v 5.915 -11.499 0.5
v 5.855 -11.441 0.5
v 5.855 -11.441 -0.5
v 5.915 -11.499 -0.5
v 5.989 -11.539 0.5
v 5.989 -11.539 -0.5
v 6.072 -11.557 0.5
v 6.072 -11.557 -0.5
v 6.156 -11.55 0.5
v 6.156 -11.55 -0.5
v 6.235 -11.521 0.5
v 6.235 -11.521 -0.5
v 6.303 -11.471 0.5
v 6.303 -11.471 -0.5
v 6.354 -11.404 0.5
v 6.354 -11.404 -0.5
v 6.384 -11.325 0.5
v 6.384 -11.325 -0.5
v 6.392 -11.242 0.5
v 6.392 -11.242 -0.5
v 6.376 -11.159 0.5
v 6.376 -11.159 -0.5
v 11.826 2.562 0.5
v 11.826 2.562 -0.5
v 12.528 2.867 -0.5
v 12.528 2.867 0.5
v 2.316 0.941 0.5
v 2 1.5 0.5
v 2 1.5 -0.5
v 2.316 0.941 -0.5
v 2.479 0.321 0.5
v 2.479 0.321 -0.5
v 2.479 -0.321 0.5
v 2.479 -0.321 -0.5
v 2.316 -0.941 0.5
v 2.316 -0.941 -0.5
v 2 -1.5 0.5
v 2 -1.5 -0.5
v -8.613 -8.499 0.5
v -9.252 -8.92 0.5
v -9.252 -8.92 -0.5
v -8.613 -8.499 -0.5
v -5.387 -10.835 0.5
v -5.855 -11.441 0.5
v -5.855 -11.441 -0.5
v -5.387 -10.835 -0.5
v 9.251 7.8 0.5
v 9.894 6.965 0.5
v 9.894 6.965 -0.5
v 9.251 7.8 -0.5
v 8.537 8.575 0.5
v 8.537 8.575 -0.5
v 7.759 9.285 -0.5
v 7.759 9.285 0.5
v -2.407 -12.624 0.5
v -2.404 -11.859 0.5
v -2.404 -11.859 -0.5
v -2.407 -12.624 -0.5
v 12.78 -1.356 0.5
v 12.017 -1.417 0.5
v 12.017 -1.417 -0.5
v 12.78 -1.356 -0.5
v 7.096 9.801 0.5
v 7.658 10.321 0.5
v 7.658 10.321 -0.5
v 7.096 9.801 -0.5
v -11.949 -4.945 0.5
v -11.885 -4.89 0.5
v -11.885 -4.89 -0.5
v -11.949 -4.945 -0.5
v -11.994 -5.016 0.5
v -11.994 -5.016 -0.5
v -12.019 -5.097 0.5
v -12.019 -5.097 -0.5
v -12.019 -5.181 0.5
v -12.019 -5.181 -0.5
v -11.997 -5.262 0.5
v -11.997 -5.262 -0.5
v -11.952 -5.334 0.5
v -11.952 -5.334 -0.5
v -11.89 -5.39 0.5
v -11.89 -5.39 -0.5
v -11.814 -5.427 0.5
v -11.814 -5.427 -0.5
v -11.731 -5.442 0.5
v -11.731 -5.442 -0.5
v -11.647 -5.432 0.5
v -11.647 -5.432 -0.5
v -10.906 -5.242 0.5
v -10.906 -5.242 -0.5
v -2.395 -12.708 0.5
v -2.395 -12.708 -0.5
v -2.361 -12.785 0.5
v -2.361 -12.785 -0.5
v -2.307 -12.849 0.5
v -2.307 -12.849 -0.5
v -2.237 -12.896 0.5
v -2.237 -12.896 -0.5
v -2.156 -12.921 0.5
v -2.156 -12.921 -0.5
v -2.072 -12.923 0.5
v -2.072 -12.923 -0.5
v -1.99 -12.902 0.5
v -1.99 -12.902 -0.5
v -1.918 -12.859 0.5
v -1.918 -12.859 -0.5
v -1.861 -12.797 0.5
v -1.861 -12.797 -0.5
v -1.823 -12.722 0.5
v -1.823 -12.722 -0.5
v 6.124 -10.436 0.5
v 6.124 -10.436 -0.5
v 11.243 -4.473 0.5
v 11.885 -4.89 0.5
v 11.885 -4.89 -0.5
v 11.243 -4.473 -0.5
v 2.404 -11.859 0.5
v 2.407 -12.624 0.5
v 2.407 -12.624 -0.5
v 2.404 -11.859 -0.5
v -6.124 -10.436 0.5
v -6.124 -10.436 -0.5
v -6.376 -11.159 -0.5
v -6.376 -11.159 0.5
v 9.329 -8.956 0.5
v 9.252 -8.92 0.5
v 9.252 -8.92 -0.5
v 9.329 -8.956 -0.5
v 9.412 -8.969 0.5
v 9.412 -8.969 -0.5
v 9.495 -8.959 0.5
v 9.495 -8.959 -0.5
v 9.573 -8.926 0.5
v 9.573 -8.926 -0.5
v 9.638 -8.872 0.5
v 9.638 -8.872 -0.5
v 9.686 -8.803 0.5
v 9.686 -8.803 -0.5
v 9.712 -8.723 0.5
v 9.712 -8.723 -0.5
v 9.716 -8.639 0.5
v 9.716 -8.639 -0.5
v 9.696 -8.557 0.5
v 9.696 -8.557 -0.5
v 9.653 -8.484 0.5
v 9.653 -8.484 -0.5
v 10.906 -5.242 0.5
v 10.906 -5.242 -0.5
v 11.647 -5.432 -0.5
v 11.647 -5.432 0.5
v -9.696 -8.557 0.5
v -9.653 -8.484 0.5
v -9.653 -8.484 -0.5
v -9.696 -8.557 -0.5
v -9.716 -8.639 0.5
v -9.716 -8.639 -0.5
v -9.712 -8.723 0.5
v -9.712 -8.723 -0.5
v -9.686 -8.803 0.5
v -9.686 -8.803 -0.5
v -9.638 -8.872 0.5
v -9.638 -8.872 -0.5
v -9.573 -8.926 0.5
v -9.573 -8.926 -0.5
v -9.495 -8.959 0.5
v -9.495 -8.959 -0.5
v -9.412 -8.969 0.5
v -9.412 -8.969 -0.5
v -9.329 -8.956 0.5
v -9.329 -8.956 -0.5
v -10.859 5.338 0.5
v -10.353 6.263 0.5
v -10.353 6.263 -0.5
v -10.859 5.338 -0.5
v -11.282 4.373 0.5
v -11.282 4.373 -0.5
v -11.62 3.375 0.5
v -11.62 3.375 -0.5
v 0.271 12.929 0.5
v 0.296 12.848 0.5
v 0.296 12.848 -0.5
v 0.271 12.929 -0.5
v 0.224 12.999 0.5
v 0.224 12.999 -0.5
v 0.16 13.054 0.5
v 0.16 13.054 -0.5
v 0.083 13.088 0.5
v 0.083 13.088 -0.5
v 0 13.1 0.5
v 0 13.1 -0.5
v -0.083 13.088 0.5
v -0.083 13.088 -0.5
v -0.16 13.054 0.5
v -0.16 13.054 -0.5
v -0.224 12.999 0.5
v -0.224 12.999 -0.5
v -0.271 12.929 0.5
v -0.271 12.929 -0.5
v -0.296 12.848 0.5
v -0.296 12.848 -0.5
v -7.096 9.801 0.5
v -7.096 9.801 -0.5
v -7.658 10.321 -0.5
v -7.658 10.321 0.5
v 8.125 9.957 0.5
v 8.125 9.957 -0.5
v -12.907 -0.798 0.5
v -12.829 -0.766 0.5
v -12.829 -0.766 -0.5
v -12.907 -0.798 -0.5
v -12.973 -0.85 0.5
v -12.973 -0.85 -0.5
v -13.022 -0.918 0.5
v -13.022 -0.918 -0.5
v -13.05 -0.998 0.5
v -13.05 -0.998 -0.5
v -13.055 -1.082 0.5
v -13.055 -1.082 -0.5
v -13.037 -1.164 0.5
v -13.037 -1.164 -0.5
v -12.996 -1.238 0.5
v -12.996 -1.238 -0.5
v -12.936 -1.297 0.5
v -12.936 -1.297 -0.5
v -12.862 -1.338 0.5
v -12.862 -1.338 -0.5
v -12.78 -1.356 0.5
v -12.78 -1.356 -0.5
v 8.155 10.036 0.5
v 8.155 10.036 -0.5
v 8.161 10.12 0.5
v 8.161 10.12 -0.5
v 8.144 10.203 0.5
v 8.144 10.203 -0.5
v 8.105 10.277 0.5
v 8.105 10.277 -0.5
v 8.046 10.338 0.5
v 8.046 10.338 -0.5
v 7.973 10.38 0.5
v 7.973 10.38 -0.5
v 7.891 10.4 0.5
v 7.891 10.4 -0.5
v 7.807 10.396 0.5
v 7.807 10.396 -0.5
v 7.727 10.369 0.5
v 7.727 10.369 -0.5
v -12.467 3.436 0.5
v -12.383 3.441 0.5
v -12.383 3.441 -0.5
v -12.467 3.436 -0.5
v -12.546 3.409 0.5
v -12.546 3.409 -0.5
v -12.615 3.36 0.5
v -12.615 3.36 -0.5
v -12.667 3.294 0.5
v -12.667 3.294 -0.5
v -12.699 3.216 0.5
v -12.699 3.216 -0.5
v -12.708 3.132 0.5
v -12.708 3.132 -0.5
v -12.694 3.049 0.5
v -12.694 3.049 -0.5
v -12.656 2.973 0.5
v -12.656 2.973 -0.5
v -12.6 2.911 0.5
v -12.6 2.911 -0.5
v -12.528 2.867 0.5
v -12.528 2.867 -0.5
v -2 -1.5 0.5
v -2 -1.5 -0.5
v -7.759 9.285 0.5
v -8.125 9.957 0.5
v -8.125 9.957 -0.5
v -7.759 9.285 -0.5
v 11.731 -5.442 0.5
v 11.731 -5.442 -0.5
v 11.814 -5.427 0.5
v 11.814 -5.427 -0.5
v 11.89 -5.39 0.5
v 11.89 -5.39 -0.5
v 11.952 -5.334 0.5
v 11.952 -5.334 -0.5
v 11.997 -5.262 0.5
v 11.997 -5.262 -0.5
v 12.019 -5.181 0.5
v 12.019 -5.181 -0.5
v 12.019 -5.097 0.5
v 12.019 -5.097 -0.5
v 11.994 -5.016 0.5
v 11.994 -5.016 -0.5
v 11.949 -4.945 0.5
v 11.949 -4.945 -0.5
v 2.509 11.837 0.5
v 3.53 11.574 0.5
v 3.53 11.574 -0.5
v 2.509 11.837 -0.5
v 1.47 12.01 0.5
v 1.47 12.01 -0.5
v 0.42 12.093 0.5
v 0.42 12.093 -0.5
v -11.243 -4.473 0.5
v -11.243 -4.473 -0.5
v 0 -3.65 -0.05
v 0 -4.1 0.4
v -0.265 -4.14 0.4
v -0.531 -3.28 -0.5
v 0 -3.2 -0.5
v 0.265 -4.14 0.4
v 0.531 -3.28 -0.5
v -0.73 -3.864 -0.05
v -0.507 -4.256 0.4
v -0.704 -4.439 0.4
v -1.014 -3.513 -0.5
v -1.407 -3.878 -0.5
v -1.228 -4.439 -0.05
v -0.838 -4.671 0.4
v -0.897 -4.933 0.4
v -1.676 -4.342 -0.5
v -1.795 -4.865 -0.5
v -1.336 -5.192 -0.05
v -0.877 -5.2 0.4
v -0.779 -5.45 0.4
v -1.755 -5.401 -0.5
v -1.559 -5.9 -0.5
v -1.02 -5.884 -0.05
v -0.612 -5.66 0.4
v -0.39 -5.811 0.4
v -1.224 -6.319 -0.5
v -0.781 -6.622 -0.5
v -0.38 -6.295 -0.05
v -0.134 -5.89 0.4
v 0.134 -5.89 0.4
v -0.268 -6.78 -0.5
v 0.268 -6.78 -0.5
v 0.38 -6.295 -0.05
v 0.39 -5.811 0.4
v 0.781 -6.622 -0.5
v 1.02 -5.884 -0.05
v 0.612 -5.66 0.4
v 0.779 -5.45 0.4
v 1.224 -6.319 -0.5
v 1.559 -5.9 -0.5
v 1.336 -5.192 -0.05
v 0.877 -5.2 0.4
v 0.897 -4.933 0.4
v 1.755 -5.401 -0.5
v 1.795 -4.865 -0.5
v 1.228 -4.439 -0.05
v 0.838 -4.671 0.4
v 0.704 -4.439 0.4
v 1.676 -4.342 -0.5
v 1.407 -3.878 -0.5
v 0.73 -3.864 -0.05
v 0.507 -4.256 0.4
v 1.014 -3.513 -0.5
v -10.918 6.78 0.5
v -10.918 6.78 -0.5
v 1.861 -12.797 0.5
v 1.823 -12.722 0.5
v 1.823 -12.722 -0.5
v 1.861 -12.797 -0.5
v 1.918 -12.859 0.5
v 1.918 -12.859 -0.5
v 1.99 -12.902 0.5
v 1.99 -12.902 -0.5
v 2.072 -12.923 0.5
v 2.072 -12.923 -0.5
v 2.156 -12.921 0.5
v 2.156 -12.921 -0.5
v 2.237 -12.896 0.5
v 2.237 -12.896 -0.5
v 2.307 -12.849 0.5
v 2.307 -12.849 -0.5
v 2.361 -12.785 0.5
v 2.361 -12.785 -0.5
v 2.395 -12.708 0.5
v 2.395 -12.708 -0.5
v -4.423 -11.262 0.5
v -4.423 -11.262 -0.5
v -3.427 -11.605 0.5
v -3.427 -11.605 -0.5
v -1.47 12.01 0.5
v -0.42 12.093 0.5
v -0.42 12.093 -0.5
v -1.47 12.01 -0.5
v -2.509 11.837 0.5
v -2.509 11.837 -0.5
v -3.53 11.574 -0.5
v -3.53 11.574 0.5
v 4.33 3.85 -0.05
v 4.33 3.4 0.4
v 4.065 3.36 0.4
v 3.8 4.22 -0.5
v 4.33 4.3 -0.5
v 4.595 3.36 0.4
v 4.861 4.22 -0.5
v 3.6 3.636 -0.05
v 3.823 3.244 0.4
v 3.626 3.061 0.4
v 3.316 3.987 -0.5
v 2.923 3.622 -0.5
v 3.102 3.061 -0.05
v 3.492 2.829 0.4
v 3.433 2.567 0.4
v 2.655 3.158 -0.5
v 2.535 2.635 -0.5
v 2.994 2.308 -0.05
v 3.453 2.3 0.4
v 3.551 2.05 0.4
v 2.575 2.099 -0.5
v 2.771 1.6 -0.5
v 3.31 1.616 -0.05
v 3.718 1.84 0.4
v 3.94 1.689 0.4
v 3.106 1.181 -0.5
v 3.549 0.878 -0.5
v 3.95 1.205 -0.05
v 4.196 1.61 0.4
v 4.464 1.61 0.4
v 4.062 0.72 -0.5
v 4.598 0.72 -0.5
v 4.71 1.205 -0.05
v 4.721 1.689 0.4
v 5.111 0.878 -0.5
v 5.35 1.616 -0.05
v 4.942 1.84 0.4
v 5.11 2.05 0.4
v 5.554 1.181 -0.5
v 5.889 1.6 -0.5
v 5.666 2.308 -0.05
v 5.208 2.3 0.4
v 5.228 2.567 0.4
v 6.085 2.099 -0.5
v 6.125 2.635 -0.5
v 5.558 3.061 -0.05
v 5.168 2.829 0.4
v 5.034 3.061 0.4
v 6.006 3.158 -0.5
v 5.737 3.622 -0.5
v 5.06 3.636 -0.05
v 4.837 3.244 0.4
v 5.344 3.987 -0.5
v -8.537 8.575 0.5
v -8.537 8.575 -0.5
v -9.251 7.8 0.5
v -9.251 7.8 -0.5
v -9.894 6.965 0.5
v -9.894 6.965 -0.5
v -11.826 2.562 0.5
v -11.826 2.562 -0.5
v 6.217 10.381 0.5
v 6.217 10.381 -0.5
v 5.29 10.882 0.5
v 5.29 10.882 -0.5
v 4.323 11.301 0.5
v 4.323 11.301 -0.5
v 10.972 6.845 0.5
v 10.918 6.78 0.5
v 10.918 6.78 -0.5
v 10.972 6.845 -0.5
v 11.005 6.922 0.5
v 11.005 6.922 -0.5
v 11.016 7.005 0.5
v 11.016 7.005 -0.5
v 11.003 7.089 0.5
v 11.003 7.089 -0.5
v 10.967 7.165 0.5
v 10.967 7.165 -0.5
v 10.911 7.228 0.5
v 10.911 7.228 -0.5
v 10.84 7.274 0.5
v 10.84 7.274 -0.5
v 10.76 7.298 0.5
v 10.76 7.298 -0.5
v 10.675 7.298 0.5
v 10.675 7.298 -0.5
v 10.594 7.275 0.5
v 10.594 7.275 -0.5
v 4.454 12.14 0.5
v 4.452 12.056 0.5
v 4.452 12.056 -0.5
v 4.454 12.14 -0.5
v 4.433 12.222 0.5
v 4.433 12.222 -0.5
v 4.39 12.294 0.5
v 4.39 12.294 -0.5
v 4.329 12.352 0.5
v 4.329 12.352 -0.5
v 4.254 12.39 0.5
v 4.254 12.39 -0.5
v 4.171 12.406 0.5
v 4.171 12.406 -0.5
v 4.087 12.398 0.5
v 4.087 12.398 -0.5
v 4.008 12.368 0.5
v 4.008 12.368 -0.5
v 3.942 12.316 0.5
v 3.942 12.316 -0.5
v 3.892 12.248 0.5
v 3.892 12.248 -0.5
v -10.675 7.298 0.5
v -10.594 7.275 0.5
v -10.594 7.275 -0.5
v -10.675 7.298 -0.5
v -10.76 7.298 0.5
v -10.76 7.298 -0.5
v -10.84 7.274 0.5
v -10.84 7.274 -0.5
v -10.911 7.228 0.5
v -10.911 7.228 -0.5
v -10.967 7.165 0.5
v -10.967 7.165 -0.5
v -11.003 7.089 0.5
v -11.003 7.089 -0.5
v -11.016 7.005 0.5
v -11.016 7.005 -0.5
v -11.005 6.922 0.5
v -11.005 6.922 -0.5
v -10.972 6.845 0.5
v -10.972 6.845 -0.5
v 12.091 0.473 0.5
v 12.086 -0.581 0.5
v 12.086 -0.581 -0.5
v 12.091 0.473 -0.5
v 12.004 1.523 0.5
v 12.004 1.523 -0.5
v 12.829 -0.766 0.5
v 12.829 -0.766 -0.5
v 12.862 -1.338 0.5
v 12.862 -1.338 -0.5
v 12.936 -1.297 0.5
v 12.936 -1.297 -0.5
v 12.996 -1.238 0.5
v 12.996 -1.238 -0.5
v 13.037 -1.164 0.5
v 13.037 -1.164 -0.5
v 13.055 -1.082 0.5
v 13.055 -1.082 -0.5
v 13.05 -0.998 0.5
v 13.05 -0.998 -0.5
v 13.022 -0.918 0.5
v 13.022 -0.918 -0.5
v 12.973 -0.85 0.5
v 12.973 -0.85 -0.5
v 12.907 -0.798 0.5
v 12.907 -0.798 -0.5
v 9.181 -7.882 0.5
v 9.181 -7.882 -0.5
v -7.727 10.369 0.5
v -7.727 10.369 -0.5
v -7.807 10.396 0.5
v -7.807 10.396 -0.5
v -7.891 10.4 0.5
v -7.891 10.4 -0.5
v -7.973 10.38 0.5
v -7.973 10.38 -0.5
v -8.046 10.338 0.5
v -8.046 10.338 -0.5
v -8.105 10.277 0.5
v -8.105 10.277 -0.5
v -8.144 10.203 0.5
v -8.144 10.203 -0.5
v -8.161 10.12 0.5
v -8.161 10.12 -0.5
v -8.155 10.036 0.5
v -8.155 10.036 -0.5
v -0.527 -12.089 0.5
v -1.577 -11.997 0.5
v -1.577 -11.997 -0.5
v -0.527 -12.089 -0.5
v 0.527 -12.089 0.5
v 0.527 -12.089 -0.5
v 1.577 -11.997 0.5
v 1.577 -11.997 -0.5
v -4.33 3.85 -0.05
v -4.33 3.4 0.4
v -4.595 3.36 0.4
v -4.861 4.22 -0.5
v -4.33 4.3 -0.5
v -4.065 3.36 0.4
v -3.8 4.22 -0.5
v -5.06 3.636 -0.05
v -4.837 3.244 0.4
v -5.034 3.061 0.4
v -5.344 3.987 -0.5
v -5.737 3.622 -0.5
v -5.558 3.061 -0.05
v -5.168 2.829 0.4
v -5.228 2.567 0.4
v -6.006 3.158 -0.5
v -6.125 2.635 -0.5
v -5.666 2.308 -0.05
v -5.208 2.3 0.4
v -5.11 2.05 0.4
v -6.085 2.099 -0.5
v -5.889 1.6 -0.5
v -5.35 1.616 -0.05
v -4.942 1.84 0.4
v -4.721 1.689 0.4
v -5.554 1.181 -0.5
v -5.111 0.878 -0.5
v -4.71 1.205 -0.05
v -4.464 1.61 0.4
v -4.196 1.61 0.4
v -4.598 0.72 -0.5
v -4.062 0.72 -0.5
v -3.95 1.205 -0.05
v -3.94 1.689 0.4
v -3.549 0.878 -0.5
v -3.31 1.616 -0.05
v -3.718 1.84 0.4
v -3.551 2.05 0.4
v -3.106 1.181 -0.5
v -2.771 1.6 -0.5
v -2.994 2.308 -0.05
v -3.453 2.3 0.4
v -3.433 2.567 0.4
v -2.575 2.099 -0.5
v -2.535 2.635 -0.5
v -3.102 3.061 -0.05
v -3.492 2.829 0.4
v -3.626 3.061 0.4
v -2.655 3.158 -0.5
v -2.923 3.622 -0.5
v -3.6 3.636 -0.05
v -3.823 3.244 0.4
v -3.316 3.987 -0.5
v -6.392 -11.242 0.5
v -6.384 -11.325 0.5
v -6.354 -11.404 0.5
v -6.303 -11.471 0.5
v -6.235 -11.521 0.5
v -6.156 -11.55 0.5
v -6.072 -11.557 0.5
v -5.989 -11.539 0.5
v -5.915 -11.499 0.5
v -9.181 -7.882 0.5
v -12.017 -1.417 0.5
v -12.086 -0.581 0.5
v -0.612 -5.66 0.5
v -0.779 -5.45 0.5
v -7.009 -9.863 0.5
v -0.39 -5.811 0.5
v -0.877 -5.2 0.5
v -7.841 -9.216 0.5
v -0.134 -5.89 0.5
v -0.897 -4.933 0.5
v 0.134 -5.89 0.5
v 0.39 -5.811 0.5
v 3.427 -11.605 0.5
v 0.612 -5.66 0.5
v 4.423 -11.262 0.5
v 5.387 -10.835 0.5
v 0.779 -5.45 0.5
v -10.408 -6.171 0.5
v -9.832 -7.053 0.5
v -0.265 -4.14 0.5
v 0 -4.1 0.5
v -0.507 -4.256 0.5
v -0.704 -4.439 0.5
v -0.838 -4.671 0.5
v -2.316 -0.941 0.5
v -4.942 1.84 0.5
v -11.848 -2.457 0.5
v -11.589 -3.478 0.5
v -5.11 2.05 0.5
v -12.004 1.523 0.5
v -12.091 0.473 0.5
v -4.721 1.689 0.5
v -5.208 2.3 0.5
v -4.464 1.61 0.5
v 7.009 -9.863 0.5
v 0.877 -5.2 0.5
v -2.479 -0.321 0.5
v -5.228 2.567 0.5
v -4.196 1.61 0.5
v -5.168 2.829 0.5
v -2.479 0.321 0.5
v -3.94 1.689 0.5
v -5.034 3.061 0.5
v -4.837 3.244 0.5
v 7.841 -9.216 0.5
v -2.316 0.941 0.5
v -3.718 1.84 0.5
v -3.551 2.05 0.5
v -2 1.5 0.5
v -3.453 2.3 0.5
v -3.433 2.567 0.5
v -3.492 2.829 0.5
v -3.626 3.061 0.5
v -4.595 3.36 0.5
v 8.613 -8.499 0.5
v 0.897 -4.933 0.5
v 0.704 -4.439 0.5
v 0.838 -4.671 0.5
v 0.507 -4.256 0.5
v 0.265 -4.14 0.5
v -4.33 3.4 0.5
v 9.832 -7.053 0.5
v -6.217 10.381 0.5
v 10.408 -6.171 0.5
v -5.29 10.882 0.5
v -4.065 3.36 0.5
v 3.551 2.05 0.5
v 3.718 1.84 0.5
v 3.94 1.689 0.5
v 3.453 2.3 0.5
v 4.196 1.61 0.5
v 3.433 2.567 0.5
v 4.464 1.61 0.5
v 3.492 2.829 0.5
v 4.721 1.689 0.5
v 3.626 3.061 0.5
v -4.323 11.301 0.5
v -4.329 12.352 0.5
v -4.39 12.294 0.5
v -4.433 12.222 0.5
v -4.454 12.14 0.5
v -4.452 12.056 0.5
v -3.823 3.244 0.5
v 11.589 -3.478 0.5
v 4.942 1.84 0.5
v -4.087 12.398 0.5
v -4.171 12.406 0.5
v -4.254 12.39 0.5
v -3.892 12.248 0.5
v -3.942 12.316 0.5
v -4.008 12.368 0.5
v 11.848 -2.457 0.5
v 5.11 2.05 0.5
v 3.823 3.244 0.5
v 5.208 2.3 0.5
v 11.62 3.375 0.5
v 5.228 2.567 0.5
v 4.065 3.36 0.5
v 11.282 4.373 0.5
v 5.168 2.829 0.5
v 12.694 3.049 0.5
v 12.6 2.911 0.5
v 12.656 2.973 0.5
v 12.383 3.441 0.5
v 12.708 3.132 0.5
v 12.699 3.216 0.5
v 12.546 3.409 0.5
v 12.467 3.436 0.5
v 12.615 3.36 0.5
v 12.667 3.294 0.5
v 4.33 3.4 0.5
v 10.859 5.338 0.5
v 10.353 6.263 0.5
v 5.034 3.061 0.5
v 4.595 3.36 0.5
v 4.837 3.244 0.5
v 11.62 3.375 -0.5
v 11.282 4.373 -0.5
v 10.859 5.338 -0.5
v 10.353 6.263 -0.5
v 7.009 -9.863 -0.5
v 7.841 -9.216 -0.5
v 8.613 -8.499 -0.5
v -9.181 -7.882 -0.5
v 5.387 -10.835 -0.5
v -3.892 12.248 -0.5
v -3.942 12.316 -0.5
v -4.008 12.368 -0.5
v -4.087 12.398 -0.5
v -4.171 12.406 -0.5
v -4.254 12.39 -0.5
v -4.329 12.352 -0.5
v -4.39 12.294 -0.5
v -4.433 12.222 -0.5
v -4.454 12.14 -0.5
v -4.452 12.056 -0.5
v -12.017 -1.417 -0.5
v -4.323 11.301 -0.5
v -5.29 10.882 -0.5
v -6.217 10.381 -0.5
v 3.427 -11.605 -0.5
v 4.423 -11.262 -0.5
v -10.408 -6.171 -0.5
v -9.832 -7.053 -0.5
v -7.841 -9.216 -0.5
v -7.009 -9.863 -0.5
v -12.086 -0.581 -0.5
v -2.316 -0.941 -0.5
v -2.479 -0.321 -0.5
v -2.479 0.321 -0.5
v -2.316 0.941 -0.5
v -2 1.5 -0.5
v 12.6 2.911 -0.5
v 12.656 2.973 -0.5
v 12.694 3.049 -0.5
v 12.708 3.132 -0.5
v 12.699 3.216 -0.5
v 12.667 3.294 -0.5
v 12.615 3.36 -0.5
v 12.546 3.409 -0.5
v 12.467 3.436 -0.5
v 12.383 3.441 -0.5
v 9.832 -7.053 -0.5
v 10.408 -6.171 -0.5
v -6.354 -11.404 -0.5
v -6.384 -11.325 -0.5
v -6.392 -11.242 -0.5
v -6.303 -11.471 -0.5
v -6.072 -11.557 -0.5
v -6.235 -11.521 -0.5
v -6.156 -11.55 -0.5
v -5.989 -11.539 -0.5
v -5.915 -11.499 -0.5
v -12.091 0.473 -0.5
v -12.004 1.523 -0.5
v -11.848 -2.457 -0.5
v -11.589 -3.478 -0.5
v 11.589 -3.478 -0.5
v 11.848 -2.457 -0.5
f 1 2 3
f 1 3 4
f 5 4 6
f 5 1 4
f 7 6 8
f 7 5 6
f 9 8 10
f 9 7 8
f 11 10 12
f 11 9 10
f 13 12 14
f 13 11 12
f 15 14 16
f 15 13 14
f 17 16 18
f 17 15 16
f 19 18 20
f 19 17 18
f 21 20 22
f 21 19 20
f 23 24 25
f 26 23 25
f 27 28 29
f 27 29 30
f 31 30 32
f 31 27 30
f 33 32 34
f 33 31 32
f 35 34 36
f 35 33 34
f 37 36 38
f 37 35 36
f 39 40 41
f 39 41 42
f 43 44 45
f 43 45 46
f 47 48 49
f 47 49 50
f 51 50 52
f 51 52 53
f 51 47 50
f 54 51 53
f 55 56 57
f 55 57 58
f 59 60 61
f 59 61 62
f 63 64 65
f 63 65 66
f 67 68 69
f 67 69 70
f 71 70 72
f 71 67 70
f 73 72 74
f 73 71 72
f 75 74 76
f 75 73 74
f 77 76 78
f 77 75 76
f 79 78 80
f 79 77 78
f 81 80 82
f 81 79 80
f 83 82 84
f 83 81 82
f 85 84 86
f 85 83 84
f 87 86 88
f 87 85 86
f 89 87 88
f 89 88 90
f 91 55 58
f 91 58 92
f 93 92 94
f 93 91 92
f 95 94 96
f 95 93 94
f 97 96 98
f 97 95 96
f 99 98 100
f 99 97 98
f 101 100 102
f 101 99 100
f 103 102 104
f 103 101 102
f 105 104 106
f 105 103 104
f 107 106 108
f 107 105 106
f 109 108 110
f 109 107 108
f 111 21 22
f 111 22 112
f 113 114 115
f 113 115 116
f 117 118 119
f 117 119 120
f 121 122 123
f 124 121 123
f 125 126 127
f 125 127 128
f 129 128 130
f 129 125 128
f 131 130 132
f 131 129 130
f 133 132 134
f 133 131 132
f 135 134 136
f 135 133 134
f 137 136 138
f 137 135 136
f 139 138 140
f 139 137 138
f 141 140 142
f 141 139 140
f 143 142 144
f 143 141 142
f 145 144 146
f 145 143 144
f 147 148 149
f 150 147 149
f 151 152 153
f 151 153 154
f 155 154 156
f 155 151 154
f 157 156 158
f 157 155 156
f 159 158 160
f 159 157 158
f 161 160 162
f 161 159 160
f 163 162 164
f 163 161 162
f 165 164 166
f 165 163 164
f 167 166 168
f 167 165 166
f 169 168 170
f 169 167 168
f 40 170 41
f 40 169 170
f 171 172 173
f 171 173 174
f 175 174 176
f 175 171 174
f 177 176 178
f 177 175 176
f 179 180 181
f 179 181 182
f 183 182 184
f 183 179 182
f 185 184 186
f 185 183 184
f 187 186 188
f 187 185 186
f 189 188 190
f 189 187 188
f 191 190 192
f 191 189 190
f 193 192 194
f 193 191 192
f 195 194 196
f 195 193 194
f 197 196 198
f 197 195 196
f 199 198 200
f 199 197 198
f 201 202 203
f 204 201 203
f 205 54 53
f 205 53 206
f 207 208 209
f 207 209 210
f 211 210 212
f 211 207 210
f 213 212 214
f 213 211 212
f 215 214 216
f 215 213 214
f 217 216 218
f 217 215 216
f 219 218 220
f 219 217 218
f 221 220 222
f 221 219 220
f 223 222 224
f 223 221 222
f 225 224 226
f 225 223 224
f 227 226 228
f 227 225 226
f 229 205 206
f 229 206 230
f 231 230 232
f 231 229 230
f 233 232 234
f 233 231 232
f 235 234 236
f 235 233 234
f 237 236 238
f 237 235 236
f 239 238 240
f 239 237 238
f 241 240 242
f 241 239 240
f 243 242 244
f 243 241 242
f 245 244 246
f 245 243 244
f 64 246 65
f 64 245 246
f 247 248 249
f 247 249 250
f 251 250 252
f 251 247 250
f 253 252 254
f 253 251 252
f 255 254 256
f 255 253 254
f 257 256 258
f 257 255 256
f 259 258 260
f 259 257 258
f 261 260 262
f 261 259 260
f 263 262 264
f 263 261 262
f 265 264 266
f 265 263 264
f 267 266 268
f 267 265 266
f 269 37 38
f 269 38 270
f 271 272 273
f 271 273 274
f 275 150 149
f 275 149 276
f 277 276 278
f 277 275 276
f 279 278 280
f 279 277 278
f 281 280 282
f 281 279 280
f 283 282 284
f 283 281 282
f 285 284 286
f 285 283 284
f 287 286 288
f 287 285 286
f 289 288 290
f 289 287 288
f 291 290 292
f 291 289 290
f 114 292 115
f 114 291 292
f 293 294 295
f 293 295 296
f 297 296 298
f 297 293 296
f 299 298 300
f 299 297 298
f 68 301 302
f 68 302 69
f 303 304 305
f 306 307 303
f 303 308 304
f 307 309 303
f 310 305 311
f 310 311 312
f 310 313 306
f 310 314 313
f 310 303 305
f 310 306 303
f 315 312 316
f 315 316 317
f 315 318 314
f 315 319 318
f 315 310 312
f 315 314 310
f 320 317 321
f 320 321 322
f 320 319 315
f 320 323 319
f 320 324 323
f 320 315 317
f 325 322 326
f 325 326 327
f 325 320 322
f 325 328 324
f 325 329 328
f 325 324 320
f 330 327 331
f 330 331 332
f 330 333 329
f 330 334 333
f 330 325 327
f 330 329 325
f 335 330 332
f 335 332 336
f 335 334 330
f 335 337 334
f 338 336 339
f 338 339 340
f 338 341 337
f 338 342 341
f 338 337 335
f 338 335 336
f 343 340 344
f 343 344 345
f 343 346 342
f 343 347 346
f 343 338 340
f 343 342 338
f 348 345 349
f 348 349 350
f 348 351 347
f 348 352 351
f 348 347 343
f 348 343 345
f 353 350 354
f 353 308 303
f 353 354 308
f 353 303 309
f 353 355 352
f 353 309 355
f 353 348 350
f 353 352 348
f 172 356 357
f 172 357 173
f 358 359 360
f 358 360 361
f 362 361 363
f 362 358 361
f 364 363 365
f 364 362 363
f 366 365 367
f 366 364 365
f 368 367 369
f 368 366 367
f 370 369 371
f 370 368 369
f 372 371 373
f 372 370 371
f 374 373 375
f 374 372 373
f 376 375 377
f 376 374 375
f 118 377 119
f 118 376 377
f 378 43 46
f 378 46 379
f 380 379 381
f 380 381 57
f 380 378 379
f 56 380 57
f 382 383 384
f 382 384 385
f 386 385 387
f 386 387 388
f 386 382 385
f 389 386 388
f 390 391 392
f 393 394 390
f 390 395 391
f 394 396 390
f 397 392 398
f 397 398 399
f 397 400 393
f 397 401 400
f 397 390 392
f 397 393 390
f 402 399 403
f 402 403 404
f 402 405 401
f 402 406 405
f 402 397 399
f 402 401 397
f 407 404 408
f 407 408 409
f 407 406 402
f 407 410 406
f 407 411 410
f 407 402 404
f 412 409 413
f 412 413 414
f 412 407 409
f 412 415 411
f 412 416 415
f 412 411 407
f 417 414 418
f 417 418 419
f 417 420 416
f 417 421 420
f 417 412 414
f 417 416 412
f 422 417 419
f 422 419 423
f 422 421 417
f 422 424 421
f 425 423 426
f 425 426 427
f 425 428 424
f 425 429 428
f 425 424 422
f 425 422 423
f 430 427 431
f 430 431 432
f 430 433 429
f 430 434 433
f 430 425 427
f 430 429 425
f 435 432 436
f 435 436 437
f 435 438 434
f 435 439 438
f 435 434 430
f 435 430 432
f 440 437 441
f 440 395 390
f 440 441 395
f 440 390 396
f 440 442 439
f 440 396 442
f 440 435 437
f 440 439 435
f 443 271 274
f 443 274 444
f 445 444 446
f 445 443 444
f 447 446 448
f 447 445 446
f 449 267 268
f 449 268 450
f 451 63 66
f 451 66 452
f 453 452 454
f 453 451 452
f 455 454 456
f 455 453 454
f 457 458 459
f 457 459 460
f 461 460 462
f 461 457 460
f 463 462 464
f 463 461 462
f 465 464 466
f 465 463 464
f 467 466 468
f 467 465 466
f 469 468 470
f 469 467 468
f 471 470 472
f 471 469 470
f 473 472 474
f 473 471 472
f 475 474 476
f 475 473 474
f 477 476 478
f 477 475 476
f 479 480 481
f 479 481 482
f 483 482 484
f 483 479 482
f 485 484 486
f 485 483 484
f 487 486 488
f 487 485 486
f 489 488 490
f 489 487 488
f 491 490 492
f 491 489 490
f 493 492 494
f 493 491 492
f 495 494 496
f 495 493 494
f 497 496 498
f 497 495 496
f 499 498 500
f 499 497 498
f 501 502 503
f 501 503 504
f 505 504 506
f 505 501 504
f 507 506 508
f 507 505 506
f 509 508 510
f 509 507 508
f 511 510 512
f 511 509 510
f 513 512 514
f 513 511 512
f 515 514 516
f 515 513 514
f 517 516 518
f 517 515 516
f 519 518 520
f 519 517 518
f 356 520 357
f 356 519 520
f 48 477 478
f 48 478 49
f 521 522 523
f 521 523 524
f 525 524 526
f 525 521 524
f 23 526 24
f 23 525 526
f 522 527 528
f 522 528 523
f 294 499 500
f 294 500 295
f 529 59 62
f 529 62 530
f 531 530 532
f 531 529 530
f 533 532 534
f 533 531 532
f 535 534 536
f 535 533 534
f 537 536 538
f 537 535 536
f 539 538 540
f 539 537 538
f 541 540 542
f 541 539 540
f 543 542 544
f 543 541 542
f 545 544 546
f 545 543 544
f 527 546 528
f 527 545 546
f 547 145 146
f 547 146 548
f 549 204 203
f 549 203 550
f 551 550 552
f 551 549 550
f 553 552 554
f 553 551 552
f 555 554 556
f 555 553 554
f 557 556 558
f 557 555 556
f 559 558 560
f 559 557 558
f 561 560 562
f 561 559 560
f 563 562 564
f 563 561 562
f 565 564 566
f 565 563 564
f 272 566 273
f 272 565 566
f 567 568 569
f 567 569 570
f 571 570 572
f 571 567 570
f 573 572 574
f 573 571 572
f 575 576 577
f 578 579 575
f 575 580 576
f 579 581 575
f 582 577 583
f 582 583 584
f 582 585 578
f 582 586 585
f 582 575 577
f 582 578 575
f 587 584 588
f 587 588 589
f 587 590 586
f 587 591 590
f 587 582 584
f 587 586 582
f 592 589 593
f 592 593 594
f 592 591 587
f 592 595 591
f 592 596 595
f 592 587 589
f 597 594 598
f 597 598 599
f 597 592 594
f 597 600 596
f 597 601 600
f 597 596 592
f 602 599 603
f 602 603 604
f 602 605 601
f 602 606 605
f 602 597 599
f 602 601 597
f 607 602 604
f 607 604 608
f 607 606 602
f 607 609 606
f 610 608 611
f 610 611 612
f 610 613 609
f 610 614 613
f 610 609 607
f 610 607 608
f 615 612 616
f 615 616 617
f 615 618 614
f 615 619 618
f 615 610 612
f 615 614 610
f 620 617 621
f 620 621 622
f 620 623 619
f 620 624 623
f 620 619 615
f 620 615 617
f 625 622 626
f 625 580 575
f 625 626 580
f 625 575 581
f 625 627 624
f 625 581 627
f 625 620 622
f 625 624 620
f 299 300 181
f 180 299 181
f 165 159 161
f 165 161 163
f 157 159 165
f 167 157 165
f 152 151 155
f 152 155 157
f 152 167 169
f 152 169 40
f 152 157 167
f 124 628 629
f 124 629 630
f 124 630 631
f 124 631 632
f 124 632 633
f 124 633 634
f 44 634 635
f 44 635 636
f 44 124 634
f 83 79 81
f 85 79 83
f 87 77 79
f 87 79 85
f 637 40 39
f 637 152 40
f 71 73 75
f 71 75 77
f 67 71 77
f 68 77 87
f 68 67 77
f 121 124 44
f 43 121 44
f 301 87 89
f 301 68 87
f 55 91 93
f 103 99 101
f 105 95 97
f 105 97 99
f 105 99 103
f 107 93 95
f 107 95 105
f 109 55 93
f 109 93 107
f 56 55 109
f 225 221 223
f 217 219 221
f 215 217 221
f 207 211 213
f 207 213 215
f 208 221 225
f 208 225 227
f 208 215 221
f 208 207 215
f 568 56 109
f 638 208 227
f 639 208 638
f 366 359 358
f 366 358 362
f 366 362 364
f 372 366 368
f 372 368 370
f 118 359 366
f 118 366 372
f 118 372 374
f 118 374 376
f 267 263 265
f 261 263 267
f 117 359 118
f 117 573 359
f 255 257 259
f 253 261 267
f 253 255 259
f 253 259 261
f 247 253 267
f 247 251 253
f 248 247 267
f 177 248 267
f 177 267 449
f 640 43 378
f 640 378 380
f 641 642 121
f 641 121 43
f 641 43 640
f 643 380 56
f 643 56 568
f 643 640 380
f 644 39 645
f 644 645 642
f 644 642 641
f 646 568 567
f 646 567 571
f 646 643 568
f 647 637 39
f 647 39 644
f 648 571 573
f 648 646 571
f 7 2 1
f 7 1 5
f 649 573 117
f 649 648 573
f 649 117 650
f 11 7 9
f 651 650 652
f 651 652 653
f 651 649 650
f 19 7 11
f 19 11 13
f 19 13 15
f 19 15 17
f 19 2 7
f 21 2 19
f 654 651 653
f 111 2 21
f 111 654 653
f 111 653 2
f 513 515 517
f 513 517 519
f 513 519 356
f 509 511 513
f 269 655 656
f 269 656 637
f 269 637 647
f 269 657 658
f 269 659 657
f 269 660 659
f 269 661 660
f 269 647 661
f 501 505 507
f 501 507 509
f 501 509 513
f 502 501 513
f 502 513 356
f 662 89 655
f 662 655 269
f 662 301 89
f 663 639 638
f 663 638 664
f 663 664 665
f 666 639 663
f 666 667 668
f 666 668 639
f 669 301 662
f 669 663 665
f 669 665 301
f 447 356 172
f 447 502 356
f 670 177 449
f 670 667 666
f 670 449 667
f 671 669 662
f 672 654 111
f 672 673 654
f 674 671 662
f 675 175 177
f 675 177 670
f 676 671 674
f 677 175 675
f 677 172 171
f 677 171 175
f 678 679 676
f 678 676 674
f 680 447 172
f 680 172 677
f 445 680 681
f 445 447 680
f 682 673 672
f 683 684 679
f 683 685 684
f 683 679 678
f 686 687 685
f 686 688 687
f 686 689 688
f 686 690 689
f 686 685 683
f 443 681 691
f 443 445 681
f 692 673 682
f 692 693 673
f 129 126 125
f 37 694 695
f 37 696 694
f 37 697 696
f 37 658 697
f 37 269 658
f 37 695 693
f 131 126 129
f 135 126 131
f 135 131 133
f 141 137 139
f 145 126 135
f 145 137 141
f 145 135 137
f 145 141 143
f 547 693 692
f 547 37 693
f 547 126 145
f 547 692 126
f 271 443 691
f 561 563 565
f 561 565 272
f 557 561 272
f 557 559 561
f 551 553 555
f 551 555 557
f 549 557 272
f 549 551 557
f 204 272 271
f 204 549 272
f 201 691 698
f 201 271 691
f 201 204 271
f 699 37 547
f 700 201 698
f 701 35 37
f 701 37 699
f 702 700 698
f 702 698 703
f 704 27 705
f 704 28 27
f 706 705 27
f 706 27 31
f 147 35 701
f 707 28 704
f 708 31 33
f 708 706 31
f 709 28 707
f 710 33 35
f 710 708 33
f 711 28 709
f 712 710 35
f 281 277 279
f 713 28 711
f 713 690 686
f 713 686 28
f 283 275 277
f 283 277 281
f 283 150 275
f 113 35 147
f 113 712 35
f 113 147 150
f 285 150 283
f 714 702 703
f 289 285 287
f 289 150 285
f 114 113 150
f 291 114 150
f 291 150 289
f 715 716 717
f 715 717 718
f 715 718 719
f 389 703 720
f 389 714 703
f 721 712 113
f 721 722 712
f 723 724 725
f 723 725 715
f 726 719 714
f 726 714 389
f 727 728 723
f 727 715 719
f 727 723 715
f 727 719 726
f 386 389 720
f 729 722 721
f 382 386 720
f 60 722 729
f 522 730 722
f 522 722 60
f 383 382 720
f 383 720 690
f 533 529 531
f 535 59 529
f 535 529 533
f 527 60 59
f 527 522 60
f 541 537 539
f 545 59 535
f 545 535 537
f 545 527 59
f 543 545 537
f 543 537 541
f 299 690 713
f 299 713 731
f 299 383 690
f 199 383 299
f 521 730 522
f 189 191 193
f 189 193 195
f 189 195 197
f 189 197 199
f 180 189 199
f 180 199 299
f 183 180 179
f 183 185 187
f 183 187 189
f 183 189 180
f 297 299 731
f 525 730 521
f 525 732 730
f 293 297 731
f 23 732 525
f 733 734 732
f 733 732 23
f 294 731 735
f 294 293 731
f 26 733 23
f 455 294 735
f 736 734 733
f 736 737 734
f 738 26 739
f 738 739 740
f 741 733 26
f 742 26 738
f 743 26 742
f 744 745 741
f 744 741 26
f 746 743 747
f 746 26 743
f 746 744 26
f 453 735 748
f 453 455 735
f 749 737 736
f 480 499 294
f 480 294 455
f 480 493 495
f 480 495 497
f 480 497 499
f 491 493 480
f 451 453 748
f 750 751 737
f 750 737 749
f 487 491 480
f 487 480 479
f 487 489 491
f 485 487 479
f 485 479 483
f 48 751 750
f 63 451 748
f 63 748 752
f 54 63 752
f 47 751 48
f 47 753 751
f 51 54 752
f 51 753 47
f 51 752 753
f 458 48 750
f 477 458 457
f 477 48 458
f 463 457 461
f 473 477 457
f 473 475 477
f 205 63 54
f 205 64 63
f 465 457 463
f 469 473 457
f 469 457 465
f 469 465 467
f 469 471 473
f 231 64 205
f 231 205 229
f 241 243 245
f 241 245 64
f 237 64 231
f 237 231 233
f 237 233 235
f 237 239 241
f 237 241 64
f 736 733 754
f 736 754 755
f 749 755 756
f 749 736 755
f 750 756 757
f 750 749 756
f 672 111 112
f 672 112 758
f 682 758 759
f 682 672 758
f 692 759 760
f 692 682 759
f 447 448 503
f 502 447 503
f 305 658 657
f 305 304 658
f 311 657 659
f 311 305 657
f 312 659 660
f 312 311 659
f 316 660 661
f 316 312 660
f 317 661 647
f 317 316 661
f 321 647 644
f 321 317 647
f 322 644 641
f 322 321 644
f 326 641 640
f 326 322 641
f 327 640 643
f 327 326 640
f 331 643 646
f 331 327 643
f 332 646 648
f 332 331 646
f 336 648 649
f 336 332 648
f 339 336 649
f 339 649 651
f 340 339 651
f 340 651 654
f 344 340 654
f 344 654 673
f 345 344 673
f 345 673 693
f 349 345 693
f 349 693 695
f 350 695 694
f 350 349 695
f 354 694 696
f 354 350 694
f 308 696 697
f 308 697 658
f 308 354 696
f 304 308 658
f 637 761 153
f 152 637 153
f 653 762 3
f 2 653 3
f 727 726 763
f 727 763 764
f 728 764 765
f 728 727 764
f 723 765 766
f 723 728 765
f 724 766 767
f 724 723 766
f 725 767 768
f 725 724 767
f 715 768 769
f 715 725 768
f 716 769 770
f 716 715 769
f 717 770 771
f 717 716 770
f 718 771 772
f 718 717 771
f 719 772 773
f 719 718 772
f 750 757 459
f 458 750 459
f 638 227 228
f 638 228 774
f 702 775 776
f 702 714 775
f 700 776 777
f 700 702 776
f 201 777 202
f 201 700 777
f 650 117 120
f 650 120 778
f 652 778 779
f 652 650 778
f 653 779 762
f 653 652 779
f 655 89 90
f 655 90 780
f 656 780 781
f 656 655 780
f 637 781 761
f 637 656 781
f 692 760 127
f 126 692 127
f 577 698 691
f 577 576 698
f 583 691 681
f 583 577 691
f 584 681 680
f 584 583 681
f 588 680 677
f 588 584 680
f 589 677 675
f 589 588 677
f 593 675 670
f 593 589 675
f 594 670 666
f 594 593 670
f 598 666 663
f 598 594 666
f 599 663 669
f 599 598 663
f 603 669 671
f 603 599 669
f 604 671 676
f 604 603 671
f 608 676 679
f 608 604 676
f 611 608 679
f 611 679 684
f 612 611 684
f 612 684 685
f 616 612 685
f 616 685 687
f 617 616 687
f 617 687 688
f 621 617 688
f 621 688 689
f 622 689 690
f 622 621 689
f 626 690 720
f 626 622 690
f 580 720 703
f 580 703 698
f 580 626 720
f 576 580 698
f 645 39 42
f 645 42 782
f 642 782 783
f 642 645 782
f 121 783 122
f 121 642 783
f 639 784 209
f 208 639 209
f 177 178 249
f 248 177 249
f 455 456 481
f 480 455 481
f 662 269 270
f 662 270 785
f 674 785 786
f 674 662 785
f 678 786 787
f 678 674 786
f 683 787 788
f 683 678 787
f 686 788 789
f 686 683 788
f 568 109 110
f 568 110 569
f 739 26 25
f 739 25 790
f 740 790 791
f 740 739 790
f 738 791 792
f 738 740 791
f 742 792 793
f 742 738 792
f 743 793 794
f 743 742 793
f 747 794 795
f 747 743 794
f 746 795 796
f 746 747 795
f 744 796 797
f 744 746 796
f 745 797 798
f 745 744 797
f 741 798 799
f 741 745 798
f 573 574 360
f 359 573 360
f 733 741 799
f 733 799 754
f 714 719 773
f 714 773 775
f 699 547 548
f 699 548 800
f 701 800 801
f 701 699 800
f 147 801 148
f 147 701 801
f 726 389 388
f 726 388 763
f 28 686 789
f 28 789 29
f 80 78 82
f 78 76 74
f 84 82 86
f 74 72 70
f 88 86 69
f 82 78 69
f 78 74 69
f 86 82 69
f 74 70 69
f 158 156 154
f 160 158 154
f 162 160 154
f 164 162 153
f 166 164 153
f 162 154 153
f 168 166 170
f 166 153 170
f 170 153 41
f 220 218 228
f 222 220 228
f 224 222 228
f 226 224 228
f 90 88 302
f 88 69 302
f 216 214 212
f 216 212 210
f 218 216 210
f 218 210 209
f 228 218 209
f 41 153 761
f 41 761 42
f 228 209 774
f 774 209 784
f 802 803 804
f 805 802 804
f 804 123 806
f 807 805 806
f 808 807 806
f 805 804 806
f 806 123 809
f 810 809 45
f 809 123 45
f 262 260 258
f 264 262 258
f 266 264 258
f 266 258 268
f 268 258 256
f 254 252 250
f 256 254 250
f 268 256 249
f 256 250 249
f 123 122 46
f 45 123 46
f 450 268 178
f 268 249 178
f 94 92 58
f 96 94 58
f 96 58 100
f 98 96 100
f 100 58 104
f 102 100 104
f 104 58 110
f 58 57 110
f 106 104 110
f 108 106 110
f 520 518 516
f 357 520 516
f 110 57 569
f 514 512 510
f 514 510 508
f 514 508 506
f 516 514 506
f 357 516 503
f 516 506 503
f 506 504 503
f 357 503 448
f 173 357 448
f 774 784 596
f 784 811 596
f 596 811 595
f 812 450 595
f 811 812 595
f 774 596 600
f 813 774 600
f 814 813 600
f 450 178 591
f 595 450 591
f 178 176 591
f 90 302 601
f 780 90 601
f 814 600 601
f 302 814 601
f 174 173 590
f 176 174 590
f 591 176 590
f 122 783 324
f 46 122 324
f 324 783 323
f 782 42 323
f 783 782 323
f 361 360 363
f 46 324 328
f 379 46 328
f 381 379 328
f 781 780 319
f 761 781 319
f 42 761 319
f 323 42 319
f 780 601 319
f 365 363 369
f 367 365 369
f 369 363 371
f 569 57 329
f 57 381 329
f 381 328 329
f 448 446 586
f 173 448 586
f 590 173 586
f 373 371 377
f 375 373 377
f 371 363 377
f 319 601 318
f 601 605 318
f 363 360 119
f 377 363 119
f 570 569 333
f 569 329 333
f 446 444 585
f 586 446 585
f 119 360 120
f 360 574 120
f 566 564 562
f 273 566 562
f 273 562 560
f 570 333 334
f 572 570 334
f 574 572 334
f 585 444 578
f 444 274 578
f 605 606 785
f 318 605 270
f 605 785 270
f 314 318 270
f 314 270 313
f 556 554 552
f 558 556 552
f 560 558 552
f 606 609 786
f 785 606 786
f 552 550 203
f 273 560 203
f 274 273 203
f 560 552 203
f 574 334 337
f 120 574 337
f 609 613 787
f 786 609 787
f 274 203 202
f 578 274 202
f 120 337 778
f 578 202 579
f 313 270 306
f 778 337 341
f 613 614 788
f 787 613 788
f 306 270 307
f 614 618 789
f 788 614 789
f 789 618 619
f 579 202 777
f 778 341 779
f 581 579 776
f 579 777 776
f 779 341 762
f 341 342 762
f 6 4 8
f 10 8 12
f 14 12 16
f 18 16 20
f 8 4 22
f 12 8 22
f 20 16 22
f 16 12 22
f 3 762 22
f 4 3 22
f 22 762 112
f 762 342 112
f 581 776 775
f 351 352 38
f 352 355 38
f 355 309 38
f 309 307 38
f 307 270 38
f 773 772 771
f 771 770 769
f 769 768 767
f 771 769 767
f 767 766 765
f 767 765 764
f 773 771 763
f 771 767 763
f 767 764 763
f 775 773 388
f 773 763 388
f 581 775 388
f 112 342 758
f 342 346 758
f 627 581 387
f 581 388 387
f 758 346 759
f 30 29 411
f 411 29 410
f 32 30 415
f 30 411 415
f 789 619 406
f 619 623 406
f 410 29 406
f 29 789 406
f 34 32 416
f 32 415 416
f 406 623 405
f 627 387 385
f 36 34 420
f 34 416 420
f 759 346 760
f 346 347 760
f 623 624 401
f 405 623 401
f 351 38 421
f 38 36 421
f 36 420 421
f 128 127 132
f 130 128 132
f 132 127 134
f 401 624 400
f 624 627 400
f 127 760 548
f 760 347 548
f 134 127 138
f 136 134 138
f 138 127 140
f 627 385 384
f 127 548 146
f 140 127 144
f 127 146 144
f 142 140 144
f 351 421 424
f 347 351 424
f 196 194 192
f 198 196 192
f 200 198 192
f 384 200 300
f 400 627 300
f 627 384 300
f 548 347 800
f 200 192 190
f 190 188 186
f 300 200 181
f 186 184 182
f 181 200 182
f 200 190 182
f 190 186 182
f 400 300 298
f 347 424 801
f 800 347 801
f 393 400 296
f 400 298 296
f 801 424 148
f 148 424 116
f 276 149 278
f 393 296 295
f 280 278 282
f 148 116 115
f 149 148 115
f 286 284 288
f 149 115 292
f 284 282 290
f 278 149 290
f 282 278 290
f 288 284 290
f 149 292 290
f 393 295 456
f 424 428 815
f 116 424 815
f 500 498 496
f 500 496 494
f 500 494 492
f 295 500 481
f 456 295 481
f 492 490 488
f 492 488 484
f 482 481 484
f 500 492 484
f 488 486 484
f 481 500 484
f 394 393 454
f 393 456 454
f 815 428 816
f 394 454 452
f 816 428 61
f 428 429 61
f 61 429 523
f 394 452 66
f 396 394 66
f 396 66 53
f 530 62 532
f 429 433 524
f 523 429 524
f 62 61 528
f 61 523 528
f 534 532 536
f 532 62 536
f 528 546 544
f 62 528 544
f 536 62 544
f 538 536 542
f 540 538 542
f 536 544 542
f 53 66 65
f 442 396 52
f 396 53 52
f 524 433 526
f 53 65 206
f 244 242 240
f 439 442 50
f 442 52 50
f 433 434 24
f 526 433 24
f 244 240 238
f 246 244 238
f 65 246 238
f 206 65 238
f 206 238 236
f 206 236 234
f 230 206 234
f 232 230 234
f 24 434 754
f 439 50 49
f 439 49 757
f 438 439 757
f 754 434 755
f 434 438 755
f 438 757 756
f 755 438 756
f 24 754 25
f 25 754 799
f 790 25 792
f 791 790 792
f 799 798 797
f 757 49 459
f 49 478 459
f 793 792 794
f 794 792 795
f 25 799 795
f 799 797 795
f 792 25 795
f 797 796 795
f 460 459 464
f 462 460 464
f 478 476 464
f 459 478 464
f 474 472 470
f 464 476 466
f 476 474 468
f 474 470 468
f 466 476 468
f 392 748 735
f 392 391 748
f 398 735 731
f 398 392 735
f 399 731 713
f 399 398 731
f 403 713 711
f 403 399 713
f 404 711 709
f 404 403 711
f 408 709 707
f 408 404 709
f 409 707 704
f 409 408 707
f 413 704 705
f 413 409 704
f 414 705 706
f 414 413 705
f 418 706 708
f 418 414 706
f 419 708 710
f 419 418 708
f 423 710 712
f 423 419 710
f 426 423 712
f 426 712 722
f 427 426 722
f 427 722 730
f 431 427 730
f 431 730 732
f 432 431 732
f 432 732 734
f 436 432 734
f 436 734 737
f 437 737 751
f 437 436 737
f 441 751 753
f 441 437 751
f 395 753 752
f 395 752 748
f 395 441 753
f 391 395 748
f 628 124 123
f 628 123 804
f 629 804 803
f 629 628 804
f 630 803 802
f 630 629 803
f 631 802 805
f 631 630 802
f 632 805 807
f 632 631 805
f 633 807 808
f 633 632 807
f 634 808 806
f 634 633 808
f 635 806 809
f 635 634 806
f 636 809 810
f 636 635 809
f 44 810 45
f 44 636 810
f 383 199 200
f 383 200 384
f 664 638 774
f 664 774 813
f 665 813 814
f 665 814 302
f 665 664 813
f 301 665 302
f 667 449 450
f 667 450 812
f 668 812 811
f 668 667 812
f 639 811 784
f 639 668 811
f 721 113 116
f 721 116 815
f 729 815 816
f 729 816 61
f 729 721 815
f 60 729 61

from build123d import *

# Parameters (mm, degrees)
MODEL_R                     = 12.1
EXTRUDE_318_DEPTH           = 0.5
CUT_EXTRUDE_1_DEPTH         = 18.141178489
EXTRUDE_892_DEPTH           = 1
PATTERN_CIRCULAR_946_COUNT  = 19
HOLE_WIZARD_M1_6_AT_2_COUNT = 2
HOLE_WIZARD_M1_6_AT_2_PITCH = 8.660254038
HOLE_WIZARD_M1_6_AT_3_COUNT = 2
HOLE_WIZARD_M1_6_AT_3_PITCH = 8.660254038


with BuildPart() as part:
    # Model → Extrude 318 (new, symmetric)
    with BuildSketch(Plane.XY):
        Circle(MODEL_R)
    extrude(amount=EXTRUDE_318_DEPTH, both=True)

    # Эскиз3 → Вырез-Вытянуть1 (cut, through all)
    with BuildSketch(Plane.XY.offset(0.5)):
        with BuildLine():
            Line((2, -1.5), (-2, -1.5))
            ThreePointArc((-2, -1.5), (-2.5, 0), (-2, 1.5))
            Line((-2, 1.5), (2, 1.5))
            ThreePointArc((2, 1.5), (2.5, 0), (2, -1.5))
        make_face()
    extrude(amount=-CUT_EXTRUDE_1_DEPTH, mode=Mode.SUBTRACT)

    # Эскиз4 → Extrude 892 (add)
    with BuildSketch(Plane.XY.offset(0.5)):
        with BuildLine():
            Line((-0.5, 11.6), (0.5, 11.6))
            Line((0.5, 11.6), (0.29607573, 12.848364887))
            ThreePointArc((0.29607573, 12.848364887), (0, 13.1), (-0.29607573, 12.848364887))
            Line((-0.29607573, 12.848364887), (-0.5, 11.6))
        make_face()
    extrude_892 = extrude(amount=-EXTRUDE_892_DEPTH)

    # Pattern Circular 946: Extrude 892 ×19 about axis
    pattern_circular_946_axis = Axis((0, 0, 0), (0, 0, 1))
    for i in range(1, PATTERN_CIRCULAR_946_COUNT):
        add(extrude_892.rotate(pattern_circular_946_axis, i * 360 / PATTERN_CIRCULAR_946_COUNT))

    # Эскиз6 → Крепление шестерни M1.6 (revolve, cut)
    with BuildSketch(Plane(origin=(4.330127019, 2.5, -0.5), x_dir=(0, 1, 0), z_dir=(1, 0, 0))):
        Polygon((0, 0), (0, 1), (0.9, 1), (0.9, 0.9), (1.8, 0), align=None)
    hole_wizard_m1_6 = revolve(axis=Axis((4.330127019, 2.5, -6.85), (0, 0, 1)), mode=Mode.SUBTRACT)

    # Крепление шестерни M1.6 at 2: Крепление шестерни M1.6 ×2
    with Locations(*[Vector(-0.49999999999999795, -0.8660254037844399, 0) * (i * HOLE_WIZARD_M1_6_AT_2_PITCH) for i in range(1, HOLE_WIZARD_M1_6_AT_2_COUNT)]):
        add(hole_wizard_m1_6, mode=Mode.SUBTRACT)

    # Крепление шестерни M1.6 at 3: Крепление шестерни M1.6 ×2
    with Locations(*[(-i * HOLE_WIZARD_M1_6_AT_3_PITCH, 0, 0) for i in range(1, HOLE_WIZARD_M1_6_AT_3_COUNT)]):
        add(hole_wizard_m1_6, mode=Mode.SUBTRACT)


solid = part.part
